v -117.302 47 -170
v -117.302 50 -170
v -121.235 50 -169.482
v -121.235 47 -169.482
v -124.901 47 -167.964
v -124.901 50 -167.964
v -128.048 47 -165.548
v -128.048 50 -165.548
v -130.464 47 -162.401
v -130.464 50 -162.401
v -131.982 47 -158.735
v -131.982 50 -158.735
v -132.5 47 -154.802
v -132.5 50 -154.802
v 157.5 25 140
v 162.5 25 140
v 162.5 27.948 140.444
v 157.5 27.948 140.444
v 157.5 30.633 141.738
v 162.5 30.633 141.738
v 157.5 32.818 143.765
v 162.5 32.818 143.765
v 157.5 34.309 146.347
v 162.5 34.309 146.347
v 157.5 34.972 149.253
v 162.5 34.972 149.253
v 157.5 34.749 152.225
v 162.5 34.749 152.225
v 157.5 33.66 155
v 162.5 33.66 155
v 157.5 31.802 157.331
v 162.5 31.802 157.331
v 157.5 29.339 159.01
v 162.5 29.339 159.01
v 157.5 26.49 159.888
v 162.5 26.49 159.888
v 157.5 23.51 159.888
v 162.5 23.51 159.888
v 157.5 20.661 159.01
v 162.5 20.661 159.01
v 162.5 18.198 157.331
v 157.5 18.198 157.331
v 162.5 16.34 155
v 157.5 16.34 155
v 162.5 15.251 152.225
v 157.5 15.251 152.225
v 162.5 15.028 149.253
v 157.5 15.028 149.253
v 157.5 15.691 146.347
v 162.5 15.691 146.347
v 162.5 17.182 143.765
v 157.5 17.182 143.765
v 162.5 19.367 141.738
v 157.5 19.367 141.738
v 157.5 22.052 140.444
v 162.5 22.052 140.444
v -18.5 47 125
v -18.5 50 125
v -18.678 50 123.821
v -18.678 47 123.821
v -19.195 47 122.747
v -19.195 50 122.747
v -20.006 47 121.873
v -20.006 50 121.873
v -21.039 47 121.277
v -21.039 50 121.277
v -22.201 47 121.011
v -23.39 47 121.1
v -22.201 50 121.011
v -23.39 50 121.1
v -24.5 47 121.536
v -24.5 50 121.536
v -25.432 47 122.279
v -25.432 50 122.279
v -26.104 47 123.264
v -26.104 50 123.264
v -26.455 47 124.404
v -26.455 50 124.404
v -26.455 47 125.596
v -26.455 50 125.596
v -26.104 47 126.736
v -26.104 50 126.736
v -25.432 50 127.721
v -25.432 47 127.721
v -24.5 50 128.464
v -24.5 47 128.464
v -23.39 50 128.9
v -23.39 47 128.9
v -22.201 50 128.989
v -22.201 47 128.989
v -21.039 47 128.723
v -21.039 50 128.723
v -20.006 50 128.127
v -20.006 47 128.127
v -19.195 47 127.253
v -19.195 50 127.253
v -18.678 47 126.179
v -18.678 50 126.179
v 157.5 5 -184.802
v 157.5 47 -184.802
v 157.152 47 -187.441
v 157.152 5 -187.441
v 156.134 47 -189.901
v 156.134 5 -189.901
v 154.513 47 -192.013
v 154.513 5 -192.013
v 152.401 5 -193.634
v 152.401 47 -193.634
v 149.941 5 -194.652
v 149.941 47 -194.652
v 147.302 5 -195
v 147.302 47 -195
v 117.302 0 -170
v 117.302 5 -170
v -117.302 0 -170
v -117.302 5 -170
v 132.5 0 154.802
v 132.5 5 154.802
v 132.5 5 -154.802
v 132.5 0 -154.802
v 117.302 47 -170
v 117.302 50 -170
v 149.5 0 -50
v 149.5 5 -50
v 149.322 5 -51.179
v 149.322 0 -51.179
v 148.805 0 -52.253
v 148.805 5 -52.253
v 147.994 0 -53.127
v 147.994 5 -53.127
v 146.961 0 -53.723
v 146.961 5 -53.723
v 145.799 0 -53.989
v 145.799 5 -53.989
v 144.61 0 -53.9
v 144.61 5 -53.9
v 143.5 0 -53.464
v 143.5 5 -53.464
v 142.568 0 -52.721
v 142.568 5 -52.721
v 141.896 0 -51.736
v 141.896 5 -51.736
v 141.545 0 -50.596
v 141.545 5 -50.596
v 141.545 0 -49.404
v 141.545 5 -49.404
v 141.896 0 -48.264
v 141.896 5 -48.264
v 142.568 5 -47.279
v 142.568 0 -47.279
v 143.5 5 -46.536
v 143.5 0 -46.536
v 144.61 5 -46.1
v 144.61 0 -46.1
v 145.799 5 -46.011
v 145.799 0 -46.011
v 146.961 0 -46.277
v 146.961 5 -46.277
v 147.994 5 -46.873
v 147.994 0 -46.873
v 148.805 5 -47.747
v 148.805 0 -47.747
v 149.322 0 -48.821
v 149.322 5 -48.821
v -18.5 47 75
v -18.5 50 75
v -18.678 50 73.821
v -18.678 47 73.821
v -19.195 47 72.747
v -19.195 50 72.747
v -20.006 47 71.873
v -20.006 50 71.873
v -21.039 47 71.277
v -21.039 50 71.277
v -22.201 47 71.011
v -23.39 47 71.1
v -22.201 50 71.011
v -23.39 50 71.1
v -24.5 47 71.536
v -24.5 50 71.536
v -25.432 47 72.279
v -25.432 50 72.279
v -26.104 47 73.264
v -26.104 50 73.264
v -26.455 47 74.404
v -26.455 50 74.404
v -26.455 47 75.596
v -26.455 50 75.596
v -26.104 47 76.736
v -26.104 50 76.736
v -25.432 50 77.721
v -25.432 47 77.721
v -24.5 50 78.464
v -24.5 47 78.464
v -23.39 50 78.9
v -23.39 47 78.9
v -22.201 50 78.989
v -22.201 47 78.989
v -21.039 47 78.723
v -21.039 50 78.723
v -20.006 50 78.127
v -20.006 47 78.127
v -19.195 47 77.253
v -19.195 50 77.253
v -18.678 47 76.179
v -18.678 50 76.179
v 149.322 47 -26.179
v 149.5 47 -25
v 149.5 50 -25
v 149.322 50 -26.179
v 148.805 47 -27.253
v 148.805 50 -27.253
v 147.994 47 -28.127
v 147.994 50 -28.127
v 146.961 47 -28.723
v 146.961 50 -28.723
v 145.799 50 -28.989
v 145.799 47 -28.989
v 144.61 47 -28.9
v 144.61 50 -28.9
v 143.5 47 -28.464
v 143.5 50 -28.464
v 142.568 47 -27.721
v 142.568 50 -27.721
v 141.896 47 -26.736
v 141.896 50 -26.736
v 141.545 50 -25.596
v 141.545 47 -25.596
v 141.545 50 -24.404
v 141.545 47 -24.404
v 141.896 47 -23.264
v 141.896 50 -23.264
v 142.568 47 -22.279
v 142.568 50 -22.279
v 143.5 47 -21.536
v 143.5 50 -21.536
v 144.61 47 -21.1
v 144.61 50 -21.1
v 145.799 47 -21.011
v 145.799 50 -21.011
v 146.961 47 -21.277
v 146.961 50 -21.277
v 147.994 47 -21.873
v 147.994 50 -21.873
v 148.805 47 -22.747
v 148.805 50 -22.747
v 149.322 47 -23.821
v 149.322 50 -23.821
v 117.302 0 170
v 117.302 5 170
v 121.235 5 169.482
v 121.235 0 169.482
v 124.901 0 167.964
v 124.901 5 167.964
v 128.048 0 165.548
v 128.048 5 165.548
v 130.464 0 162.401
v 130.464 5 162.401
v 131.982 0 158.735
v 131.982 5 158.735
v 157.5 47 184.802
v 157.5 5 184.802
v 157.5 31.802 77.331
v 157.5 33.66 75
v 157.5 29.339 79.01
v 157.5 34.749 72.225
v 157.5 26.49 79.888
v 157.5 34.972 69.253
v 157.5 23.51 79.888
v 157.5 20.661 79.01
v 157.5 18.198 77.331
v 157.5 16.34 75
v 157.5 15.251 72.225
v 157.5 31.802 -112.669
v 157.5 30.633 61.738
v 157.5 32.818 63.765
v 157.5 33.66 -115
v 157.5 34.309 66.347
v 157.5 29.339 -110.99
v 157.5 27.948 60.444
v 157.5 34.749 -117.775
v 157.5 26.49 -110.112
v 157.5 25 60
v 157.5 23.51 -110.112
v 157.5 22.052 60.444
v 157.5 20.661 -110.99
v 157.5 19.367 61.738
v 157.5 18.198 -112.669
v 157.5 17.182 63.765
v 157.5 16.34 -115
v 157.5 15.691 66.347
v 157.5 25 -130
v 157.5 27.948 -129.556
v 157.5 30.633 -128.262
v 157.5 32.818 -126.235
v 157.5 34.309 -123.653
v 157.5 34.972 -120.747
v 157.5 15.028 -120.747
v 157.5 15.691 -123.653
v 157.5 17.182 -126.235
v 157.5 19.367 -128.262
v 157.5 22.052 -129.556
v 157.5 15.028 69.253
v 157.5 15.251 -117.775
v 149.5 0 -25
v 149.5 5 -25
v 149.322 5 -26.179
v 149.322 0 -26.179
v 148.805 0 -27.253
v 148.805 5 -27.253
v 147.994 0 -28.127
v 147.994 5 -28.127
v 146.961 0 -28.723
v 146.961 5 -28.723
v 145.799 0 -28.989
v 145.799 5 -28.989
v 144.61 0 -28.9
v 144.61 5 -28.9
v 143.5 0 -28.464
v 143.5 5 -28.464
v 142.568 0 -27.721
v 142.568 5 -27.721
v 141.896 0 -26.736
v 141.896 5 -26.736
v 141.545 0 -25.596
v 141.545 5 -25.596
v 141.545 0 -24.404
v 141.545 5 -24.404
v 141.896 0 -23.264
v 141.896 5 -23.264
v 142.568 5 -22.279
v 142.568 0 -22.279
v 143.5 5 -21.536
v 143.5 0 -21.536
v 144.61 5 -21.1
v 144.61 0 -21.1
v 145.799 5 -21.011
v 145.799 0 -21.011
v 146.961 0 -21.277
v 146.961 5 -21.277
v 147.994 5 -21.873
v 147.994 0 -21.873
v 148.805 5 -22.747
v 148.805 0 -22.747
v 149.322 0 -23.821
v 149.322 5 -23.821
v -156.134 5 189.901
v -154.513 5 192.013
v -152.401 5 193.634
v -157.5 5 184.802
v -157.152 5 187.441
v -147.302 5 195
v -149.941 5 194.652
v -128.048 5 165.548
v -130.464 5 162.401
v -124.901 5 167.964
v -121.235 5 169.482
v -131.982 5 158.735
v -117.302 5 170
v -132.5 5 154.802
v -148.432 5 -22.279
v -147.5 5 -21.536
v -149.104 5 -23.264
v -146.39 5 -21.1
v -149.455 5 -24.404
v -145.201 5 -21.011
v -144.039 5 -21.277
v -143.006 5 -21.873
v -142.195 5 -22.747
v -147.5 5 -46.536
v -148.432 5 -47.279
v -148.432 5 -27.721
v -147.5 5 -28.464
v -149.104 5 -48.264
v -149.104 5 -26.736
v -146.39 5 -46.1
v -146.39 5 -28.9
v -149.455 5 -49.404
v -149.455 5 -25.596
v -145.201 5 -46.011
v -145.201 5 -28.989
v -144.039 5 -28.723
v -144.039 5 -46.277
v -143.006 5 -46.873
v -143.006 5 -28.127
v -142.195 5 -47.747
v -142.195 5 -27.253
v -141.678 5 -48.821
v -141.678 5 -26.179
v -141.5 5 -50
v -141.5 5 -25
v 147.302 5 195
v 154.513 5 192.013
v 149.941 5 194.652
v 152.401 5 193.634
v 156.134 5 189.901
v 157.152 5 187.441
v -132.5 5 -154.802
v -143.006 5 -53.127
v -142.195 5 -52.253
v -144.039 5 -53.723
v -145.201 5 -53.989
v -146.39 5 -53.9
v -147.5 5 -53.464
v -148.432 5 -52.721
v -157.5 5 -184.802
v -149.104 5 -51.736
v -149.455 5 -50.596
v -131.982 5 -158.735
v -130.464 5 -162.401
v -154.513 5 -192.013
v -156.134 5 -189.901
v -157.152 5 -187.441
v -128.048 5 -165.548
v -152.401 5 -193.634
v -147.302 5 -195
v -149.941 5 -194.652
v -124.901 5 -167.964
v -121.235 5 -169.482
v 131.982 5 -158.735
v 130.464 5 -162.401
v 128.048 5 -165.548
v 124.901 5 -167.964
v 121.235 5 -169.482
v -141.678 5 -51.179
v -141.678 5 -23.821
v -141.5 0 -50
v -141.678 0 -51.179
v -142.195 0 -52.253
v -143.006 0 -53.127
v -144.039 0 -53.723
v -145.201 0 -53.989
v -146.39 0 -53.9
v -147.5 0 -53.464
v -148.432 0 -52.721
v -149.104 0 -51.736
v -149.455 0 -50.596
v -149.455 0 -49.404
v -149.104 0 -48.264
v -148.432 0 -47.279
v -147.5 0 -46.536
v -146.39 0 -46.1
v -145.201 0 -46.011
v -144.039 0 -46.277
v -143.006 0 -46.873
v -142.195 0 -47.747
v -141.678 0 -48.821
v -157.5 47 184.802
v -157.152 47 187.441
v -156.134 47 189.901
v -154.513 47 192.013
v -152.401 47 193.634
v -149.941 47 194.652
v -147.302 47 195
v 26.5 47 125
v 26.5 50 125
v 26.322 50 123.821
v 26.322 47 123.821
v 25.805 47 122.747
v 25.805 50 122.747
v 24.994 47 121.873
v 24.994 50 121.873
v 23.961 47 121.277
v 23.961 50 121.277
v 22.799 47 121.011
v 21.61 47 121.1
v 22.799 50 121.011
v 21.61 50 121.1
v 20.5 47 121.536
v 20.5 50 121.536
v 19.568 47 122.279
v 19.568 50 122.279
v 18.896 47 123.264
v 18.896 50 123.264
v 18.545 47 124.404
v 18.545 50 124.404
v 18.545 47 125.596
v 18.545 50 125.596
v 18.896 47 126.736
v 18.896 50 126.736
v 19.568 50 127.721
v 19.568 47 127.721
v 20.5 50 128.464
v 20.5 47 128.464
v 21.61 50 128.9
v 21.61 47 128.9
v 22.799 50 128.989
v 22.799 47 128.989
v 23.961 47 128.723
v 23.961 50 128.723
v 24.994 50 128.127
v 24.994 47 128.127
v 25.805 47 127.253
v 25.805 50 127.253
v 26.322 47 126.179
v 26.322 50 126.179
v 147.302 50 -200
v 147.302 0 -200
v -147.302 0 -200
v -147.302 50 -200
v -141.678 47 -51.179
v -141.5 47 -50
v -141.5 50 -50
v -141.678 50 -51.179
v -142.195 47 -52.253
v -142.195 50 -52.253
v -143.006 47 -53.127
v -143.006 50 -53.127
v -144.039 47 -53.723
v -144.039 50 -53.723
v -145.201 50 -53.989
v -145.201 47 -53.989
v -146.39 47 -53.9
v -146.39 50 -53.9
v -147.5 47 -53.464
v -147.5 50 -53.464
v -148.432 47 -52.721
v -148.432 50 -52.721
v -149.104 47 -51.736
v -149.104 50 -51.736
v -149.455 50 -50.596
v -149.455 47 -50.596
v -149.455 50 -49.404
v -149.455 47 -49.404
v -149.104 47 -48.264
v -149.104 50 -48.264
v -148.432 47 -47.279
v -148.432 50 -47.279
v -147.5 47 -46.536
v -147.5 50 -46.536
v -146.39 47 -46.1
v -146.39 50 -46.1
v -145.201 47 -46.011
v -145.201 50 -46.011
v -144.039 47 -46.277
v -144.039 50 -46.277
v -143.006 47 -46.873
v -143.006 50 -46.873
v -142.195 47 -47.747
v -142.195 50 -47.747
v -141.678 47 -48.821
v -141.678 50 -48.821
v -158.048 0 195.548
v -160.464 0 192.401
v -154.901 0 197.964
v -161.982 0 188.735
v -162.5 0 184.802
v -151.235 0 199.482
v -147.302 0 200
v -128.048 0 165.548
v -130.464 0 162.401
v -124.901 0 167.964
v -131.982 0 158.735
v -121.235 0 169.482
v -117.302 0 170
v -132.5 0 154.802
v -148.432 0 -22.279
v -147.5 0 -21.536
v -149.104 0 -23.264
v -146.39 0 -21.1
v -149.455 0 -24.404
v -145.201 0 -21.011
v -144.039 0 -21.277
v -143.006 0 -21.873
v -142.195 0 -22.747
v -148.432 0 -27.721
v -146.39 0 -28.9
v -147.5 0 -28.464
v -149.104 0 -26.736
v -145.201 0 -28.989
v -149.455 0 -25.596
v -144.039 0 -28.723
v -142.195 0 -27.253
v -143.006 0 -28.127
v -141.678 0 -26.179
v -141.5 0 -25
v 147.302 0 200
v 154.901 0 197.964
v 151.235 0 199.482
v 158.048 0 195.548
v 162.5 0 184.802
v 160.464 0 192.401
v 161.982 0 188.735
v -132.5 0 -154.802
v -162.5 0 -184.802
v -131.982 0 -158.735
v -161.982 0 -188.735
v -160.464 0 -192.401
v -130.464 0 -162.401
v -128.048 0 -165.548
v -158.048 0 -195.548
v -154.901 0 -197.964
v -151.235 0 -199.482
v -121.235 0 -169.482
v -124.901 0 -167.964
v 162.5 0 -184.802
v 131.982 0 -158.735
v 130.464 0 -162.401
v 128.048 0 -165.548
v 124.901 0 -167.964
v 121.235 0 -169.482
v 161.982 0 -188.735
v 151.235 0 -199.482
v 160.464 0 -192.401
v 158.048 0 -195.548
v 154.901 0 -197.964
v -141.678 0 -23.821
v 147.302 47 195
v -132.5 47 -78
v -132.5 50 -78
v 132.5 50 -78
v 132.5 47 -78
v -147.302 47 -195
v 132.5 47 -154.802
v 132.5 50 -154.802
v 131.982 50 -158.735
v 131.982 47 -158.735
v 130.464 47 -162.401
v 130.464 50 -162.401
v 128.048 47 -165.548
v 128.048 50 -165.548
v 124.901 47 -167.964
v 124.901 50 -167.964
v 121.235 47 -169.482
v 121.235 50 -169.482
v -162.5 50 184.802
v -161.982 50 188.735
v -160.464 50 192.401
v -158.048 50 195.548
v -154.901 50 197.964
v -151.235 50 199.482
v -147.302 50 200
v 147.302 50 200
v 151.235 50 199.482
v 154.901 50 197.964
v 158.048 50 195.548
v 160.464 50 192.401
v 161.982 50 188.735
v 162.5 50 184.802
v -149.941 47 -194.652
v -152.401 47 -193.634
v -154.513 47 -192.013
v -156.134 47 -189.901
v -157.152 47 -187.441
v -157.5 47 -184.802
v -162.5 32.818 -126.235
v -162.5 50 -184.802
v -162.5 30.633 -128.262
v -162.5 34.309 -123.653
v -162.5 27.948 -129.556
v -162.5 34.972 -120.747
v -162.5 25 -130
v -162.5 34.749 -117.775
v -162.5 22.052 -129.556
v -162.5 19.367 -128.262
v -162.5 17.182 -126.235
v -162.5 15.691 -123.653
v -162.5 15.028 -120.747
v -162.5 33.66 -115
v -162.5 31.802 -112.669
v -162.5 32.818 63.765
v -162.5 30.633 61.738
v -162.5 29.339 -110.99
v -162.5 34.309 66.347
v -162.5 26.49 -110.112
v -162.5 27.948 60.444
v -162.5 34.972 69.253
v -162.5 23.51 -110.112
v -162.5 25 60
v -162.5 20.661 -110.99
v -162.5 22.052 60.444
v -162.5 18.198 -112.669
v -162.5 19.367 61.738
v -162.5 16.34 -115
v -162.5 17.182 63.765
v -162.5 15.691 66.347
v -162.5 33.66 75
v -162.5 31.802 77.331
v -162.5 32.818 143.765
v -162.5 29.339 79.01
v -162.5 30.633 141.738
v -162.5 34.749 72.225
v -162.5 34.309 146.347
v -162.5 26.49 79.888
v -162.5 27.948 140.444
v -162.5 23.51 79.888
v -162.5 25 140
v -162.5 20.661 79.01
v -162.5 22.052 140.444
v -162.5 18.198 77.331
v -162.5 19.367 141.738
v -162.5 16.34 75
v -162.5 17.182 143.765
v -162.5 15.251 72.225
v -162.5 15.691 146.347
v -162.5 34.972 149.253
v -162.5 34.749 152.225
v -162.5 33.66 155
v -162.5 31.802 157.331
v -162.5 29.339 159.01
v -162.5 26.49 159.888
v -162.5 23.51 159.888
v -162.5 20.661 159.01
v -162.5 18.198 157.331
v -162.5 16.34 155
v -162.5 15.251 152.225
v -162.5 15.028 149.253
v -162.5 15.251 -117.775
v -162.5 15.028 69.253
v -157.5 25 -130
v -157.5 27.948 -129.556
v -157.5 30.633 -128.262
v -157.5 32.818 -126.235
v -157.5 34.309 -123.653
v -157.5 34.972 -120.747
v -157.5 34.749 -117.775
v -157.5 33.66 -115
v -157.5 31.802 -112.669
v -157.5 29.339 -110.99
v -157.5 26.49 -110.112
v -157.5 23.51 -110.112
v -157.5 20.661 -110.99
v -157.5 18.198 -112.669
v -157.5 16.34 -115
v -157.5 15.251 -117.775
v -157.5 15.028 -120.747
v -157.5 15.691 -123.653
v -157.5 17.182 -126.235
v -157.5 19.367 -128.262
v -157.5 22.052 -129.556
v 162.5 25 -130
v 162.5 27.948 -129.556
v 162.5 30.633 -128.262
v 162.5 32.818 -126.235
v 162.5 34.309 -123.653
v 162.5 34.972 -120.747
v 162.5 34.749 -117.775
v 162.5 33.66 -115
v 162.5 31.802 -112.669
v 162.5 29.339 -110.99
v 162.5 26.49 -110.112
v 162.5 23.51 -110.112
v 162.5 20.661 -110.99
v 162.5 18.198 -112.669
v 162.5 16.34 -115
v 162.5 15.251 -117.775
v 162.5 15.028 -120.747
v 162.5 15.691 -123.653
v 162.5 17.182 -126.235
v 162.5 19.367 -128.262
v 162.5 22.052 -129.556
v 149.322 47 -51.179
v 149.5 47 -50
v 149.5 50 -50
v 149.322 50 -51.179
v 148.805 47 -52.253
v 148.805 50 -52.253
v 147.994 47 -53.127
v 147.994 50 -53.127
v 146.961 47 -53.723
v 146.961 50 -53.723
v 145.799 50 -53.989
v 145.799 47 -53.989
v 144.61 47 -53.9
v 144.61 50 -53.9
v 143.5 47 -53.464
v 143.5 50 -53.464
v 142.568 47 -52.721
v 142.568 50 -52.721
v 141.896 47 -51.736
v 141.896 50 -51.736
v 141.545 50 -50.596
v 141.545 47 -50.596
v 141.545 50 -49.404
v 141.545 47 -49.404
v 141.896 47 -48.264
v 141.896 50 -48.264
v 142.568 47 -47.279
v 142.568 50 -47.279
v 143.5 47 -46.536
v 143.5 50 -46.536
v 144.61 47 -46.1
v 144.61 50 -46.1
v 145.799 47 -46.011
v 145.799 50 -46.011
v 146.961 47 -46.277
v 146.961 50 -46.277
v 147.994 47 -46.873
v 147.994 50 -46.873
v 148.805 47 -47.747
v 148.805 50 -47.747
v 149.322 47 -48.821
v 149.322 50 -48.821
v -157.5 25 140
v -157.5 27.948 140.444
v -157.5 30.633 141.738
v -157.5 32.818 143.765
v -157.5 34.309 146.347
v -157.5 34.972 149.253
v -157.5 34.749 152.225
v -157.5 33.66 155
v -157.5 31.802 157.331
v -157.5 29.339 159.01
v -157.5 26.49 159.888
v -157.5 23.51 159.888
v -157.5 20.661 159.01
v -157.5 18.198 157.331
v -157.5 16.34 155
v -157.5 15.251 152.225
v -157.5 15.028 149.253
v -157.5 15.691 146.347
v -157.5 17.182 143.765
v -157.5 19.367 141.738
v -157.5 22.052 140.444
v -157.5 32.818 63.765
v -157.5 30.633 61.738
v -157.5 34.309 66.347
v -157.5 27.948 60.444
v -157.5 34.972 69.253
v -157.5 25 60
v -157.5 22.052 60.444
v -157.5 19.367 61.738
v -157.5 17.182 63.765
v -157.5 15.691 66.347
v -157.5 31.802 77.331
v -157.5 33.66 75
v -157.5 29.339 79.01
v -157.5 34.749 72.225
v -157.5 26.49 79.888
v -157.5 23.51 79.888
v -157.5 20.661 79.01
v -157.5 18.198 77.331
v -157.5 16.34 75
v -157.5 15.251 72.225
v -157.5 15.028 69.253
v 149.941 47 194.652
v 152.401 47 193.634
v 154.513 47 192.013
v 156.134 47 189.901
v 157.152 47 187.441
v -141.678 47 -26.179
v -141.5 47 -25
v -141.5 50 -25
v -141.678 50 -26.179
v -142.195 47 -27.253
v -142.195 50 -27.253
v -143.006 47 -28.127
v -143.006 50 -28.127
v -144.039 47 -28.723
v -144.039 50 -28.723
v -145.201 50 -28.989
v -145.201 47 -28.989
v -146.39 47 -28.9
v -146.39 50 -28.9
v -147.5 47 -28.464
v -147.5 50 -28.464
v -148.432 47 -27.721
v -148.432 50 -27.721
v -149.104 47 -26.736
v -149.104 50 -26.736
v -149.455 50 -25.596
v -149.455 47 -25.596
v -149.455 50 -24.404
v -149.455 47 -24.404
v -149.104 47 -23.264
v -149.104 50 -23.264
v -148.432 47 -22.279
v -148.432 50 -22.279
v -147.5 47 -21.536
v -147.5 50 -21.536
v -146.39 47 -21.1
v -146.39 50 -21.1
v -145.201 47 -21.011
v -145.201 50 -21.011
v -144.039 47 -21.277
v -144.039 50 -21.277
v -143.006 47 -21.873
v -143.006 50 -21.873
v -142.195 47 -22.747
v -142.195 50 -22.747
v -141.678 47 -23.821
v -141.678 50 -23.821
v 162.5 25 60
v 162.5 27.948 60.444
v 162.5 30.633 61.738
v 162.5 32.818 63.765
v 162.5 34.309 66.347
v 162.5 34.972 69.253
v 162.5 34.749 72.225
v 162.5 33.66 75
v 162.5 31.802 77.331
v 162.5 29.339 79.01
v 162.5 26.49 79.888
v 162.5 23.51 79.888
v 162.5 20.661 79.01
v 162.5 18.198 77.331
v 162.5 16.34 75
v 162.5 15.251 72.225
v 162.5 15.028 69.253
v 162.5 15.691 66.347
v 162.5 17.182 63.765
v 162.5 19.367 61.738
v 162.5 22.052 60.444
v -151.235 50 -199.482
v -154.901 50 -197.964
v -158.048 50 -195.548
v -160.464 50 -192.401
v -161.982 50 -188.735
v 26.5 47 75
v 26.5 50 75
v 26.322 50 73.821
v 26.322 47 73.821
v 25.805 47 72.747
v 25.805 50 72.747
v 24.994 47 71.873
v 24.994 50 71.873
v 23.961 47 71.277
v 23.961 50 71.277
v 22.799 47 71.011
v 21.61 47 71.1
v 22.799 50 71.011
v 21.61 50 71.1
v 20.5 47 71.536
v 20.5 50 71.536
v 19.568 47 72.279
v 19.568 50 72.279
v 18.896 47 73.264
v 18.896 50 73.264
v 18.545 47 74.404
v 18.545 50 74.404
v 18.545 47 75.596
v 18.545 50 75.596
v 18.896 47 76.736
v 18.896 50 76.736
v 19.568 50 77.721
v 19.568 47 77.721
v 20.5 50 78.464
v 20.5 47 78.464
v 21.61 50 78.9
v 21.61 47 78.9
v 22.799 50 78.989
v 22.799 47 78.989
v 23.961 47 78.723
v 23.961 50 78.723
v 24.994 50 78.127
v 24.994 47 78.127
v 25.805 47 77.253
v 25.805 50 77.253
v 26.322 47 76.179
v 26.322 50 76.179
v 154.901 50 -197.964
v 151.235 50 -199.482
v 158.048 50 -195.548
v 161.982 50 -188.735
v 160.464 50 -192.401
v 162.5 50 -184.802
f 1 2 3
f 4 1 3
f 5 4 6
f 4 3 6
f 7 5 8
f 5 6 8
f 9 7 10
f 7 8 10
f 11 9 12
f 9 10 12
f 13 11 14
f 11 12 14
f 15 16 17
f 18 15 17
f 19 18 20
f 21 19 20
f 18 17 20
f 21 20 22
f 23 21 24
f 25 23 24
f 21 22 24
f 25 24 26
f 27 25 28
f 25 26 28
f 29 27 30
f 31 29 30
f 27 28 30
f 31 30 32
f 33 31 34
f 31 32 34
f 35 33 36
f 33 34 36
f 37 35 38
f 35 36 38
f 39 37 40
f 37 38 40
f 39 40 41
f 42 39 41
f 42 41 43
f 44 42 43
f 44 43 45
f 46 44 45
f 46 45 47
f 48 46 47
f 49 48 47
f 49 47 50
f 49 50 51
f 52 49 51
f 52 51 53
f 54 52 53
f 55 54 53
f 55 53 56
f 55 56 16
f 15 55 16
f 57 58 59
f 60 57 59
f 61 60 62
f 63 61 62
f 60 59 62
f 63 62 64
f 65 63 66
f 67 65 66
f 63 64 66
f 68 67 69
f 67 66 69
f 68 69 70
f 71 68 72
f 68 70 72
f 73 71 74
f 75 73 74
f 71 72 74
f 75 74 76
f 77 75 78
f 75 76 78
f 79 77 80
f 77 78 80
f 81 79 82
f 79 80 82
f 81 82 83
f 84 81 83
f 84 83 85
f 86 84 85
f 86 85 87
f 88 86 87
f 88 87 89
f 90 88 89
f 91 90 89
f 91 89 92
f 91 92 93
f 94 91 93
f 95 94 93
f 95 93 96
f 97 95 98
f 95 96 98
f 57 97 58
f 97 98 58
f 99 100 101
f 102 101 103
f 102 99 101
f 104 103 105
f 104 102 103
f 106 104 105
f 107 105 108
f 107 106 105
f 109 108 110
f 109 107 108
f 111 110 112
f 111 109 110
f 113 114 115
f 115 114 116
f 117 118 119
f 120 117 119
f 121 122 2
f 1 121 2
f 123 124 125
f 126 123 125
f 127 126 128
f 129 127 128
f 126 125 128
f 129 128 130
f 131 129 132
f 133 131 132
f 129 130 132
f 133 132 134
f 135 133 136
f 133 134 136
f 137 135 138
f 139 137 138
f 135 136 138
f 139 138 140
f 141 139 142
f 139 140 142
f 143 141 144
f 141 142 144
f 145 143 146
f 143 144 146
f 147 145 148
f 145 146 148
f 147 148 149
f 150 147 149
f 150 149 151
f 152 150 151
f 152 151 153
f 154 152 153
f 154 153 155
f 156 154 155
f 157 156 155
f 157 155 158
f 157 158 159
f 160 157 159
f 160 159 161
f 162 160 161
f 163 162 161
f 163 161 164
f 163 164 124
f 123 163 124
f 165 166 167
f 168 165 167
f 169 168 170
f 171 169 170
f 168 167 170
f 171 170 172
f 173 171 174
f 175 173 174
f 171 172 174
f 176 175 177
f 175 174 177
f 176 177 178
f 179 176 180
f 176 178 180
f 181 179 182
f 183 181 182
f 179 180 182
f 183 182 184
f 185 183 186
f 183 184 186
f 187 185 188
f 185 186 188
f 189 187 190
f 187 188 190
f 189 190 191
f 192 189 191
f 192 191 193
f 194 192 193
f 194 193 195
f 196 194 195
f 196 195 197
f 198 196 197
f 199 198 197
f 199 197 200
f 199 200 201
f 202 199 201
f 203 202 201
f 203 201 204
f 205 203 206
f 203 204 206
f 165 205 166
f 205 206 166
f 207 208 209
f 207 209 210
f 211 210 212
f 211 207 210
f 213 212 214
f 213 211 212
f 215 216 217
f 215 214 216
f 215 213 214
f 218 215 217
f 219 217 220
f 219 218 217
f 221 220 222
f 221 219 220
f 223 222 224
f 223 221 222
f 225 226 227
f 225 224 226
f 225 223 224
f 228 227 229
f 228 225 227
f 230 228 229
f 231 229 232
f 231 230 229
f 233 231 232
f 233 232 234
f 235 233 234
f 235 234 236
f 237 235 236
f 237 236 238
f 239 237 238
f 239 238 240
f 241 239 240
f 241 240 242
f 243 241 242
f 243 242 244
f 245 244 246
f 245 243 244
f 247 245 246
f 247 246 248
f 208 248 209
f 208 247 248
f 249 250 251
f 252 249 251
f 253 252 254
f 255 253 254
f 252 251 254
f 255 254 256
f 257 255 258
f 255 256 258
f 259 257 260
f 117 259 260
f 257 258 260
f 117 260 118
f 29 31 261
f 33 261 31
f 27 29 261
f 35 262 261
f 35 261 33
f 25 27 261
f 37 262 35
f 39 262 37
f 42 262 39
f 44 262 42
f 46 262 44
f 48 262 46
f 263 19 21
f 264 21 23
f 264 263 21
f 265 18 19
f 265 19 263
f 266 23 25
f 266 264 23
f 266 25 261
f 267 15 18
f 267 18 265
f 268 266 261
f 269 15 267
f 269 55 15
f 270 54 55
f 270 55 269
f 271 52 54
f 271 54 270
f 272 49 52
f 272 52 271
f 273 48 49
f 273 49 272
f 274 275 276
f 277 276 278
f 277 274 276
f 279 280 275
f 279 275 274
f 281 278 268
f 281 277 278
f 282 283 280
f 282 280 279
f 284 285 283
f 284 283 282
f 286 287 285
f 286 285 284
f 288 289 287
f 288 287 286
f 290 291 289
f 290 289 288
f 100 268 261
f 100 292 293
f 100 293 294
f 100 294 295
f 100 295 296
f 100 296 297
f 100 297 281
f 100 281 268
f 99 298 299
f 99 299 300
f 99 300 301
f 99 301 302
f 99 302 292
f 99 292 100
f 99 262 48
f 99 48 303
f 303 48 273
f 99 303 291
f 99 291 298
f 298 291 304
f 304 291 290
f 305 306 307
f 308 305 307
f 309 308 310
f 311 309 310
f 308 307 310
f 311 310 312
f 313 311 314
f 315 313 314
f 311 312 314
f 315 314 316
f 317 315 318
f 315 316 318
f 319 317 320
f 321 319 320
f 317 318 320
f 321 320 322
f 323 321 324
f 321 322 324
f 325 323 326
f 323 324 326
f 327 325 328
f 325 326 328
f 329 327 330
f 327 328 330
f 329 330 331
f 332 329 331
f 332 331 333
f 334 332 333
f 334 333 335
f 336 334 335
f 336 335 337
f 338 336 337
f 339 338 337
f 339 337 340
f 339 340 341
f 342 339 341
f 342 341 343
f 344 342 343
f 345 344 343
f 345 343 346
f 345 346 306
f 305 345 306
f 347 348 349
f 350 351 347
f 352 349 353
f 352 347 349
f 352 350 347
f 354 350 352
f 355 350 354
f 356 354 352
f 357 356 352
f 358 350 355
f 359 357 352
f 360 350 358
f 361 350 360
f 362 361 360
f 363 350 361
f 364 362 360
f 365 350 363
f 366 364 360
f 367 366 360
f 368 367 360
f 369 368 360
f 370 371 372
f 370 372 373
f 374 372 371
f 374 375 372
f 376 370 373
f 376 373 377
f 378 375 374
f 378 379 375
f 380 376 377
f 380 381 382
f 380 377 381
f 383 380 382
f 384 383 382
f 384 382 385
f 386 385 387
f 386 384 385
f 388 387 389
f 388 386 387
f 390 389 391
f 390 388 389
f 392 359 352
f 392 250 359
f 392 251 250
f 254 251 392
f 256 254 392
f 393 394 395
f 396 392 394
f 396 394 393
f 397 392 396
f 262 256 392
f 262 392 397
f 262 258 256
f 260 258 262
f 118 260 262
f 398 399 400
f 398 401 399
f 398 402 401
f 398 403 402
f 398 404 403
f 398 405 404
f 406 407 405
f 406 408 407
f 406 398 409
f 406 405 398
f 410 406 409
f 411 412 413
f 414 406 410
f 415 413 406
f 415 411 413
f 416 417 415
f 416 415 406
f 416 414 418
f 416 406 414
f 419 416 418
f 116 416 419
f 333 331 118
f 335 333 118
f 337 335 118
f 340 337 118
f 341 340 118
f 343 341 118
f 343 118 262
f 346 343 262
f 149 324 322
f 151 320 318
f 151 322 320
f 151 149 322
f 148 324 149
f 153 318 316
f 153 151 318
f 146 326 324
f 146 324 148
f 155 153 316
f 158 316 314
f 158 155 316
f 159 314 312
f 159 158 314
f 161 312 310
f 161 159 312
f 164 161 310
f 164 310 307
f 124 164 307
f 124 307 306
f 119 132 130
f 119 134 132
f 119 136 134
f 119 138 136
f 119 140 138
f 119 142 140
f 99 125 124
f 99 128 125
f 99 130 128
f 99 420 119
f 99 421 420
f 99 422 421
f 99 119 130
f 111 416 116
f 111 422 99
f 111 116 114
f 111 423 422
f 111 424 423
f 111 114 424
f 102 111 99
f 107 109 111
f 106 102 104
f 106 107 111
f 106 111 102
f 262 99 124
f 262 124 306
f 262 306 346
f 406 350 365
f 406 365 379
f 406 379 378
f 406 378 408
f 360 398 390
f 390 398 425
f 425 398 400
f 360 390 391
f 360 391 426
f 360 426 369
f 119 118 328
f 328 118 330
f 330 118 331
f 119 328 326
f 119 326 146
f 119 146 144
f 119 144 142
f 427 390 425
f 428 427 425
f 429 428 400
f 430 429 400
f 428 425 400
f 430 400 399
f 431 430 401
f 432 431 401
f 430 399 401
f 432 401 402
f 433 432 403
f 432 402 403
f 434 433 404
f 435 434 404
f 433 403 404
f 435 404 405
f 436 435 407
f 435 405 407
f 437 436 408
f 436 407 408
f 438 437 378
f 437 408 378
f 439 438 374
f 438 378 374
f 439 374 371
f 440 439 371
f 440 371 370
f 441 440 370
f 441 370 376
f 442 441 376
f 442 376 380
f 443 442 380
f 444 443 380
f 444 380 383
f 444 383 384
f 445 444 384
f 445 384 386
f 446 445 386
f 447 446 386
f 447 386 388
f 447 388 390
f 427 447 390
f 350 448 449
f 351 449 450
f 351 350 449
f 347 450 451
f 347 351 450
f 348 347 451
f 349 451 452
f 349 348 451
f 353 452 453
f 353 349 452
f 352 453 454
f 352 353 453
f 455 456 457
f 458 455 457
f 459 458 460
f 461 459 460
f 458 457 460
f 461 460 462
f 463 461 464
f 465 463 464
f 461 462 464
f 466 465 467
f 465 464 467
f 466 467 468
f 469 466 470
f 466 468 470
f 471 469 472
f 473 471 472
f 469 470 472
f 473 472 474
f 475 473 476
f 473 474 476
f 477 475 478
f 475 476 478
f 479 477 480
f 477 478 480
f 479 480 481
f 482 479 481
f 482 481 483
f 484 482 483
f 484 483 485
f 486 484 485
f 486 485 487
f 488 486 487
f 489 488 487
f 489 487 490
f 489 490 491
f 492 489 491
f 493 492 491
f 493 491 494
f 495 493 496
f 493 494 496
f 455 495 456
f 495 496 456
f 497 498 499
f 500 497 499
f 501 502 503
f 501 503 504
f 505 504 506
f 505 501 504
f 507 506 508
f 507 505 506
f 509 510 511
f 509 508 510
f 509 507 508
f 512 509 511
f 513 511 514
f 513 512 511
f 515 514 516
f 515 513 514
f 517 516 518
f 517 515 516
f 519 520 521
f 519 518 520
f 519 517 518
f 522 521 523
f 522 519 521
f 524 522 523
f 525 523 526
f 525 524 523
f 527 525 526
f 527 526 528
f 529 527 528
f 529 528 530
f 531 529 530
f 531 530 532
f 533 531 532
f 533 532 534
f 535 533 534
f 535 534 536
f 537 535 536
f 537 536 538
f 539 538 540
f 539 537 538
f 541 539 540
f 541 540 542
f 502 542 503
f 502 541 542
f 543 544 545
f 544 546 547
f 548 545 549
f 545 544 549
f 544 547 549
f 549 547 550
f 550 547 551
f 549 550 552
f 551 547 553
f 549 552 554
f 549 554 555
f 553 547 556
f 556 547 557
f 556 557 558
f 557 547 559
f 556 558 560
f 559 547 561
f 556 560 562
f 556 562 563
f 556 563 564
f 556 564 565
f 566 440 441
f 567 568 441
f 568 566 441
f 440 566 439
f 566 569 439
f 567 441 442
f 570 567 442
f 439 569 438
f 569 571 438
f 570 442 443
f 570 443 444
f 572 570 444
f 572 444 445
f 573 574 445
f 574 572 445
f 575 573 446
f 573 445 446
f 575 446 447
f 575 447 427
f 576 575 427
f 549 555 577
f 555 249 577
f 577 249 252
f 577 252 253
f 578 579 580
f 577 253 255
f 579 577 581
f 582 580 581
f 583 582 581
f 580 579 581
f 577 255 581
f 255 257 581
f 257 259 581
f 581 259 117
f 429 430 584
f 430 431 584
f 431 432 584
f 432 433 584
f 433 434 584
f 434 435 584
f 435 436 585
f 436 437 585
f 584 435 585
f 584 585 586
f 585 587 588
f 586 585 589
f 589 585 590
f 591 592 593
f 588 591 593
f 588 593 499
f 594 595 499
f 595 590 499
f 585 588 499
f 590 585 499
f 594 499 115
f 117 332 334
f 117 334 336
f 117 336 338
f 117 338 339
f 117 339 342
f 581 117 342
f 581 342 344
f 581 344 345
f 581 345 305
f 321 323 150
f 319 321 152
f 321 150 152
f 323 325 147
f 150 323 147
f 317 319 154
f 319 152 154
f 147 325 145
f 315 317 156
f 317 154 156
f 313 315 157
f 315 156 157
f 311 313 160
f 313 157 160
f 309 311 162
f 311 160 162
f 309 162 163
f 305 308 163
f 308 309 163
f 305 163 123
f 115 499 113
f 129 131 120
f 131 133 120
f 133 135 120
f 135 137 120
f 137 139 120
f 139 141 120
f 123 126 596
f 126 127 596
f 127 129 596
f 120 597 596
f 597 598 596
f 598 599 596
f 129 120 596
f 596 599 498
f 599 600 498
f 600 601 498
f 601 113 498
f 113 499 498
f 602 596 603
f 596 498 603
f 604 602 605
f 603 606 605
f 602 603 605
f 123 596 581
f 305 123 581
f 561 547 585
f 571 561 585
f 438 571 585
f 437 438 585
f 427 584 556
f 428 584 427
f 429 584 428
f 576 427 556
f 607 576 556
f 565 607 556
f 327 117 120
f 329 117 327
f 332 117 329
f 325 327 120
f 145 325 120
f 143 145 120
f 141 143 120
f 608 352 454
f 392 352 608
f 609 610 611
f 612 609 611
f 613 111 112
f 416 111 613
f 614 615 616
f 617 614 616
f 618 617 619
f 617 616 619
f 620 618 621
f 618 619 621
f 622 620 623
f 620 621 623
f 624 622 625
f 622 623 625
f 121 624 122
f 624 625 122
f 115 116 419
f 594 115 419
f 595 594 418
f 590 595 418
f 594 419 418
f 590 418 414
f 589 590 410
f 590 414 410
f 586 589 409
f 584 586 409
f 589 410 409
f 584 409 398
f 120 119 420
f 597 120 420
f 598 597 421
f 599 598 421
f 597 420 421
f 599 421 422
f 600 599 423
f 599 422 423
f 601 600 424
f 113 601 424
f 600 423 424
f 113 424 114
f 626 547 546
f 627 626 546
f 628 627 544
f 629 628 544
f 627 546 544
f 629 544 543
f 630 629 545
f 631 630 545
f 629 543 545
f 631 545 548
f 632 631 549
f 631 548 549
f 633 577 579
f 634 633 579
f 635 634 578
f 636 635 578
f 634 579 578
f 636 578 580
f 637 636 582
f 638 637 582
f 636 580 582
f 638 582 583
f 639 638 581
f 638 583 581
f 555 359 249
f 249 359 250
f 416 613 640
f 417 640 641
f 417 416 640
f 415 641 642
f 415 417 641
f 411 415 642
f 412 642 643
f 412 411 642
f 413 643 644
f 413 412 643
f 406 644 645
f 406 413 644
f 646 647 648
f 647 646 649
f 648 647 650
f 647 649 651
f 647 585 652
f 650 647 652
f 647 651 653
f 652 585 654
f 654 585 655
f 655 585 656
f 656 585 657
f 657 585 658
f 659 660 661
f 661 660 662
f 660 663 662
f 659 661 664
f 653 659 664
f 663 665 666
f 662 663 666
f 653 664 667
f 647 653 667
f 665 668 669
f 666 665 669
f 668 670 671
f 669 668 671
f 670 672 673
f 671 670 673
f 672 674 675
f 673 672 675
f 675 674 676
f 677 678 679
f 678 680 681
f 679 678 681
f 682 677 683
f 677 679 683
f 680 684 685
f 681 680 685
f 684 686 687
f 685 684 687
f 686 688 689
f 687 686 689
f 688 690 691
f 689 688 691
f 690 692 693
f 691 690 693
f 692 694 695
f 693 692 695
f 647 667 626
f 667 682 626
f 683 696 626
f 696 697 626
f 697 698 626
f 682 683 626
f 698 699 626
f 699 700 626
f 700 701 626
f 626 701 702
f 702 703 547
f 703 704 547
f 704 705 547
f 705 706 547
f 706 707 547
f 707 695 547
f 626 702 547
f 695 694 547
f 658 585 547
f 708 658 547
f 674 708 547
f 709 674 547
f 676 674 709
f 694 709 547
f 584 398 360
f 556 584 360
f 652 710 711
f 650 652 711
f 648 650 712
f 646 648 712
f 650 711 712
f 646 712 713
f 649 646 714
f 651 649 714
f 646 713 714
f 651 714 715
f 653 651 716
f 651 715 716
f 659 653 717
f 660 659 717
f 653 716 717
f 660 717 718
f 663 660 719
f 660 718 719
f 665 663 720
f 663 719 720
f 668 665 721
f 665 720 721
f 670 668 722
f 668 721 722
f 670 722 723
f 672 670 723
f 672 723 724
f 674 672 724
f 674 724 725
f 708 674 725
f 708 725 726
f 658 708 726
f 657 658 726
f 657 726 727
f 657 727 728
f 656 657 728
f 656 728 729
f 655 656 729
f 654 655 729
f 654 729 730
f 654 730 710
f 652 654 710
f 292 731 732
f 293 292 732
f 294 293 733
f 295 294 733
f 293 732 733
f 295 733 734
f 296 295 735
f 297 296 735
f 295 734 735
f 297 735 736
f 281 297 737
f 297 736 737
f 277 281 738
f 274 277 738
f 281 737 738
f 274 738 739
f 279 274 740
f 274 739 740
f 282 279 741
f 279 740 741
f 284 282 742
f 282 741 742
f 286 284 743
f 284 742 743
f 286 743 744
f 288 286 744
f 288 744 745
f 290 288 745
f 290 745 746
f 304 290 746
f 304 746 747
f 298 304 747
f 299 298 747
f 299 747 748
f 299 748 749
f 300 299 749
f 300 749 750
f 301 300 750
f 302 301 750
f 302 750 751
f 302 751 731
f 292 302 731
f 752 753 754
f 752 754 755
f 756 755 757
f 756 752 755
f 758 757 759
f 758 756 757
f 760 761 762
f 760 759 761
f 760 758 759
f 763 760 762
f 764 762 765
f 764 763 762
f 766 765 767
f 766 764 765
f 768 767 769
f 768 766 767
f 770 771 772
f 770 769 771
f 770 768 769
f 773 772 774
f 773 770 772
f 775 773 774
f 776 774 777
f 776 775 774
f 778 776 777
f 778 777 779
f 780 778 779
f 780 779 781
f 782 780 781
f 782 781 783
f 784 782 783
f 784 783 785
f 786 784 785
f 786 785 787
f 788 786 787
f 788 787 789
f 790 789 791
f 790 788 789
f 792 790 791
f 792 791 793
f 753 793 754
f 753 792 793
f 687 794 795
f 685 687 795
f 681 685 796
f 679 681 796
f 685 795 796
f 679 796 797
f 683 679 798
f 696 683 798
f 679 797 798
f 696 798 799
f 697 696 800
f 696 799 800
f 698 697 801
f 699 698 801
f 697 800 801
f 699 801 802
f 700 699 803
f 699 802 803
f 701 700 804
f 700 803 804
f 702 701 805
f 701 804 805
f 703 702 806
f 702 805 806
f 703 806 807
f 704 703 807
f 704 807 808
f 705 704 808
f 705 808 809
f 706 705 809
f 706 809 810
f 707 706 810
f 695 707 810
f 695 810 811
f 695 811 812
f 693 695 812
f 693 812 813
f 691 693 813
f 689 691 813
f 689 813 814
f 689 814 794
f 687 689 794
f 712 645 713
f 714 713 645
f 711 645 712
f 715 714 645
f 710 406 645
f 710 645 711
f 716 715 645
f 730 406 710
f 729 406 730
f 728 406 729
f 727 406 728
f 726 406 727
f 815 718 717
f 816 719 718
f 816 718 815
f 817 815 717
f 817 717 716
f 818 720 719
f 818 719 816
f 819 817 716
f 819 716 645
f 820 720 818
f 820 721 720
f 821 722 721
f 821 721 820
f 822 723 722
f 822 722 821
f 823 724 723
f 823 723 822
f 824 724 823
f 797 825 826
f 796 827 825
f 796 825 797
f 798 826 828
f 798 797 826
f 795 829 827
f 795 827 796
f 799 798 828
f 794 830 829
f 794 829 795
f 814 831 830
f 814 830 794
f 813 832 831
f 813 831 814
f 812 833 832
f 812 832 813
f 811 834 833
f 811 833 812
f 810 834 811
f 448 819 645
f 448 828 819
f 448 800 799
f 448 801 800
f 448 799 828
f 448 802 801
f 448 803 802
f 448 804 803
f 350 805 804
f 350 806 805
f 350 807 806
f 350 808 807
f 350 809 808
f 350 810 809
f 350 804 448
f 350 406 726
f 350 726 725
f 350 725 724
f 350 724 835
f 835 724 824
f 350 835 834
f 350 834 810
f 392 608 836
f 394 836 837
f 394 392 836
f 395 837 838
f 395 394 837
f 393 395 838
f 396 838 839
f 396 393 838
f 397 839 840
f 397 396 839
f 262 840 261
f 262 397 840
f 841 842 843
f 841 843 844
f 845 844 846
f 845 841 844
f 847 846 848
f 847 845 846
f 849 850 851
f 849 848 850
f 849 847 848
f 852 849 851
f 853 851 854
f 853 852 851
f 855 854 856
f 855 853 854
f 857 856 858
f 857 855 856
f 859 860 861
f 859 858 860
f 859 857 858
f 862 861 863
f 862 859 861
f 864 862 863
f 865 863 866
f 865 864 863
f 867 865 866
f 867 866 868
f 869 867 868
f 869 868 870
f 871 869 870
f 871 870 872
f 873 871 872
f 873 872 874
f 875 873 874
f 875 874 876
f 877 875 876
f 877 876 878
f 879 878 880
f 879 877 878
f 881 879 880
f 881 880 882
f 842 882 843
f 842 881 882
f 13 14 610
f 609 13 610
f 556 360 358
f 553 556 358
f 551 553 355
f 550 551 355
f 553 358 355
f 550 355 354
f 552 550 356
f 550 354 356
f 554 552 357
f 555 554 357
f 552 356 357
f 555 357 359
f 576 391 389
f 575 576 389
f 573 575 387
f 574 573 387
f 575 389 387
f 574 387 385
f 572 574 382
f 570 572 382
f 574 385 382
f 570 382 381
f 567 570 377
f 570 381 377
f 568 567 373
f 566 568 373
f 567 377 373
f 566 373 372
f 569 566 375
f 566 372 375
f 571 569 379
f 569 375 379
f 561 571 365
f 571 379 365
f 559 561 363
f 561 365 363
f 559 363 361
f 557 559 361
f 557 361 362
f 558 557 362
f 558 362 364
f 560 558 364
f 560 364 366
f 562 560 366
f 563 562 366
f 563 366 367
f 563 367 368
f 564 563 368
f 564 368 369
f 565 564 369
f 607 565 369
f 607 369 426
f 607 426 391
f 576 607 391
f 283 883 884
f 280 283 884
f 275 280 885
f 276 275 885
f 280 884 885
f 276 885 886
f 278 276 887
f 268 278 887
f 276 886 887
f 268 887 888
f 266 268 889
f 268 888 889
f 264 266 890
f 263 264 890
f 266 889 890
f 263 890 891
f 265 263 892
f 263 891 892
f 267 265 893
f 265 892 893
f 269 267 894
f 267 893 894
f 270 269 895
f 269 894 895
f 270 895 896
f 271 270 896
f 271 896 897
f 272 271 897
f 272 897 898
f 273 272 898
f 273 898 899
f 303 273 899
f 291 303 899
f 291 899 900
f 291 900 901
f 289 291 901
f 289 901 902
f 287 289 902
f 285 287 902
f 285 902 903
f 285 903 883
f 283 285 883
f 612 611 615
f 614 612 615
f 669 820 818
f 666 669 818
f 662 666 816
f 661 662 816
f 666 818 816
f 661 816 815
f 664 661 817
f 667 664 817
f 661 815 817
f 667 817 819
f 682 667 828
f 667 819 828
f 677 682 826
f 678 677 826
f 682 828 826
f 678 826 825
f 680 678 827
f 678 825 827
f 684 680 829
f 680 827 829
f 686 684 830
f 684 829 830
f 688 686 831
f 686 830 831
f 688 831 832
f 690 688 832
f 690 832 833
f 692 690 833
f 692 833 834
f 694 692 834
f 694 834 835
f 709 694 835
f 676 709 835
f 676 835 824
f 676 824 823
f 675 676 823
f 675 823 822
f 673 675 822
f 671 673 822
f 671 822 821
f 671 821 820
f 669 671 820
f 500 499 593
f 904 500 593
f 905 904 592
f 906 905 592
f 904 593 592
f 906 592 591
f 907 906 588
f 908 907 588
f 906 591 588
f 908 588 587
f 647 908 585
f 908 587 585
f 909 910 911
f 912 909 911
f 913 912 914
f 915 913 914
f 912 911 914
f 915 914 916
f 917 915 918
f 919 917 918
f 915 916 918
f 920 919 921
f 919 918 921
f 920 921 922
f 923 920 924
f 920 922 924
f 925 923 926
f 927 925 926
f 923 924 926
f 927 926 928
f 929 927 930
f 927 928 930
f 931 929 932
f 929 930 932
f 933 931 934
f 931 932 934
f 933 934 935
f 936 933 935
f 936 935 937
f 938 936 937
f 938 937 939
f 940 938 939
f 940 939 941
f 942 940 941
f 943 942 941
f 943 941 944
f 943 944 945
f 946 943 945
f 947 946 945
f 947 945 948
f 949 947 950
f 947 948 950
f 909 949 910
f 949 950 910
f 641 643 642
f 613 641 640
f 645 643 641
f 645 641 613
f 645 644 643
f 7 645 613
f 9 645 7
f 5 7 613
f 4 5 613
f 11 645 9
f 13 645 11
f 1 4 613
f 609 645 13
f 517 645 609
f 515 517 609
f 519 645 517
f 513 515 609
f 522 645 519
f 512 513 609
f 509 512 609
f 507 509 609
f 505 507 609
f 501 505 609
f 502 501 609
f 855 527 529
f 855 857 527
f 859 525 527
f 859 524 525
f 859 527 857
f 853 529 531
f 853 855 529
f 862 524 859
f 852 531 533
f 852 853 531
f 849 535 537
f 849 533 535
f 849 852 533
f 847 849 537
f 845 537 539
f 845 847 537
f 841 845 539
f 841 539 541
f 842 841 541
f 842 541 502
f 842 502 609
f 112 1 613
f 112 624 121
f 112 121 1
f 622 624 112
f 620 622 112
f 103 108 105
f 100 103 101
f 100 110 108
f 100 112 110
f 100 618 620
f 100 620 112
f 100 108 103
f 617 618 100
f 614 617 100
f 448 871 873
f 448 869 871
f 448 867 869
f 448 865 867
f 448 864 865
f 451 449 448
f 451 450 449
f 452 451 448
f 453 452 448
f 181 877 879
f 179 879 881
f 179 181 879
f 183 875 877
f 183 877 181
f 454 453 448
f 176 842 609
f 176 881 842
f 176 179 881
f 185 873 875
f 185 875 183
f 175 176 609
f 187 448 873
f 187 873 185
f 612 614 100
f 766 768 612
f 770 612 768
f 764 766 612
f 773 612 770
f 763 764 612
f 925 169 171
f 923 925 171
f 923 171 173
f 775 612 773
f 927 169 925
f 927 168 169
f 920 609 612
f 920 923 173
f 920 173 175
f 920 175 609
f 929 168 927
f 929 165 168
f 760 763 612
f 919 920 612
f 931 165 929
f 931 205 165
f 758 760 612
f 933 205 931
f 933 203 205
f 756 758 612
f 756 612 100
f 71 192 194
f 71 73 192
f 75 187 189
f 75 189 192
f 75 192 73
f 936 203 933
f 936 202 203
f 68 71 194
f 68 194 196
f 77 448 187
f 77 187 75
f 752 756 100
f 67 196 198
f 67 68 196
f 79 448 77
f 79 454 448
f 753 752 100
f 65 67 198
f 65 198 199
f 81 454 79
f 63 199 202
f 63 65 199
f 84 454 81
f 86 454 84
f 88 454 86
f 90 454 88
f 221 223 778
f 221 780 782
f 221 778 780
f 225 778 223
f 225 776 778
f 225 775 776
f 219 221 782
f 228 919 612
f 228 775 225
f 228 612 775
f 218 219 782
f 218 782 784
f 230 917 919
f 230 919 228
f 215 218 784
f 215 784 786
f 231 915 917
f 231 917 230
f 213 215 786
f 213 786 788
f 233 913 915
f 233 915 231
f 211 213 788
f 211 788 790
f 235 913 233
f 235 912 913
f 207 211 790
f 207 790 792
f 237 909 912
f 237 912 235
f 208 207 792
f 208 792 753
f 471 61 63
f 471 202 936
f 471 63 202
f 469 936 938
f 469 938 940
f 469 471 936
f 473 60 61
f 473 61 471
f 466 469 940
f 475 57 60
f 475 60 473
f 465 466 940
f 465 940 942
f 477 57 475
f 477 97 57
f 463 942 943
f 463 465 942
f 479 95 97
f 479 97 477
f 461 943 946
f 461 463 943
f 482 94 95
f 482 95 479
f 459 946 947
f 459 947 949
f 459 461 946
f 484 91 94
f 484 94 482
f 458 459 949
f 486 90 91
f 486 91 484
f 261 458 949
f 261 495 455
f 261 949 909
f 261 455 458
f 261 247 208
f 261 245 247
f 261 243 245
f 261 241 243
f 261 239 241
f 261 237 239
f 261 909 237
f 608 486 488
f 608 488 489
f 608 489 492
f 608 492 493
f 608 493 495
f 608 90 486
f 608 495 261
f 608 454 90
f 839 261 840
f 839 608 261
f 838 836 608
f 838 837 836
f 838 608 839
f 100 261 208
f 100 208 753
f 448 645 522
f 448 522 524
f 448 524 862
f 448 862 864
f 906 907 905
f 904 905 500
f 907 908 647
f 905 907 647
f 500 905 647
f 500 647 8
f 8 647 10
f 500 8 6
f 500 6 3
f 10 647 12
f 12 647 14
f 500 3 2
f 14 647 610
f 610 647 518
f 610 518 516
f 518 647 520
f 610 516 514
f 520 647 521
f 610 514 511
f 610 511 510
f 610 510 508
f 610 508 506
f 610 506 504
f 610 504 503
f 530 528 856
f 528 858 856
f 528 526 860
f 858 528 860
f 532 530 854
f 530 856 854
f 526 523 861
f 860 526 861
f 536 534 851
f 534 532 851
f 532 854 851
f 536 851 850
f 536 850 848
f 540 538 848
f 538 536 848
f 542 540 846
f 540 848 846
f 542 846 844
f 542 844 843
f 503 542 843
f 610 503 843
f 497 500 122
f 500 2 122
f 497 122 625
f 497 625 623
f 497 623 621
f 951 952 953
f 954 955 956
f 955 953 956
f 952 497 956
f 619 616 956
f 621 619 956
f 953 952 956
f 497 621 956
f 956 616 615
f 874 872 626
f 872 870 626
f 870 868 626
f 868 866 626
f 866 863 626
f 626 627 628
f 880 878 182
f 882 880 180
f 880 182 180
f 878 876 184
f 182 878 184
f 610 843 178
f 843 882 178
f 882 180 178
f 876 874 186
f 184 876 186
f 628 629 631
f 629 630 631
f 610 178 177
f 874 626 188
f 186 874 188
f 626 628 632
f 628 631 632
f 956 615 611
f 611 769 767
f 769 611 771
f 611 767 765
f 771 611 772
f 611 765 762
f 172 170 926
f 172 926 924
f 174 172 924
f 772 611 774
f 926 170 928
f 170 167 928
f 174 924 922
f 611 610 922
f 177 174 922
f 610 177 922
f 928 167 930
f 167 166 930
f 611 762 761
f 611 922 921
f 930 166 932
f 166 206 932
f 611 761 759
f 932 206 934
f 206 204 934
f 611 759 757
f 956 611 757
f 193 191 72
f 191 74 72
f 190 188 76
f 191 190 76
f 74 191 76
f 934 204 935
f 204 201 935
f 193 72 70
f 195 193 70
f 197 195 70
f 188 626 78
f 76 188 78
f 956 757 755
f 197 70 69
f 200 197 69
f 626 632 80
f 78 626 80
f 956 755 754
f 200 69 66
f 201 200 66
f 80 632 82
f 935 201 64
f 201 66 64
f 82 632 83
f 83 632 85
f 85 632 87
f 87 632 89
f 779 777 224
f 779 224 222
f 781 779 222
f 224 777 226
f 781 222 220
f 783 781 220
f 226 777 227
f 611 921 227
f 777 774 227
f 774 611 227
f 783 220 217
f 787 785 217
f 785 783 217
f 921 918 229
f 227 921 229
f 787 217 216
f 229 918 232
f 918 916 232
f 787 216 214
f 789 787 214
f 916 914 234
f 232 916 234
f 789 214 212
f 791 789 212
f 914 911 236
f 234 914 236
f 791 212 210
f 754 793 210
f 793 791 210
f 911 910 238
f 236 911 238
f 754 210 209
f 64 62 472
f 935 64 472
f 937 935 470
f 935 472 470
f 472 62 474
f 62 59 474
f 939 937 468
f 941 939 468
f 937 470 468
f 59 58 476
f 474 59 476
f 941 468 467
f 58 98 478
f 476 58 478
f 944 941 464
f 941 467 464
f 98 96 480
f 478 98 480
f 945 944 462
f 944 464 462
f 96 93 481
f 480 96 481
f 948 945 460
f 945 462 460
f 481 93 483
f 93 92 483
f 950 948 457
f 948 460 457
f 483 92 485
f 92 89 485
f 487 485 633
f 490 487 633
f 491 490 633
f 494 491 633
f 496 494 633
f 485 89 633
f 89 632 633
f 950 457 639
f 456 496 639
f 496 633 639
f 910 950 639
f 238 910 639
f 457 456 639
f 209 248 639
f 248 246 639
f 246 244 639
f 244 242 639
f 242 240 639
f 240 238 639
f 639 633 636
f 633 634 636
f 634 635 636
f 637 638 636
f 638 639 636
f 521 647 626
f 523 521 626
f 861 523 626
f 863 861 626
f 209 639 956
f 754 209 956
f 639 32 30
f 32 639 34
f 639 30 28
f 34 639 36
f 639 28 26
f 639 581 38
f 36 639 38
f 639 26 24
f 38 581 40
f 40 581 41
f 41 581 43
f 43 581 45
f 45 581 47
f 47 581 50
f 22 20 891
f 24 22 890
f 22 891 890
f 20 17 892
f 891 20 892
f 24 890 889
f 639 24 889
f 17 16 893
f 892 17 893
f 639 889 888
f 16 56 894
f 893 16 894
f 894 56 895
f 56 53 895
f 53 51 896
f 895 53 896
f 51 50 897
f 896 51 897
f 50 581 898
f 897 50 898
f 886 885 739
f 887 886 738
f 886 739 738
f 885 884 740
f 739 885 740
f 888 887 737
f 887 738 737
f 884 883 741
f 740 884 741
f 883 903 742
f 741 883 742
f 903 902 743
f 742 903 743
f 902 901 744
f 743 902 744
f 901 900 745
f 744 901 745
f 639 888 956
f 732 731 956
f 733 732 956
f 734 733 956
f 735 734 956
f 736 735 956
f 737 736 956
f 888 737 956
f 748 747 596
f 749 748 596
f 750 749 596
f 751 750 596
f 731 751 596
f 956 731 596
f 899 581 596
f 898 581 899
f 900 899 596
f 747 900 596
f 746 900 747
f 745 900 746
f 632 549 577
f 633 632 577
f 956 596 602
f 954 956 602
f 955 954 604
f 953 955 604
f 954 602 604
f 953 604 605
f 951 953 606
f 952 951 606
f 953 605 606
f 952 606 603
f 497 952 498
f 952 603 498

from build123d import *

# Parameters (mm, degrees)
BOSS_EXTRUDE1_DEPTH     = 50
SHELL1_T                = -5
SKETCH2_R               = 10
CUT_EXTRUDE1_DEPTH      = 325
BOSS_EXTRUDE2_DEPTH     = 3
CUT_EXTRUDE2_DEPTH      = 50
SKETCH6_R               = 4
CUT_EXTRUDE3_DEPTH      = 46
CUT_EXTRUDE3_DEPTH_BACK = 6
SKETCH7_W               = 265
SKETCH7_H               = 3
BOSS_EXTRUDE4_DEPTH     = 187
SKETCH8_R               = 4
CUT_EXTRUDE4_DEPTH      = 3
SKETCH7_2_W             = 265
SKETCH7_2_H             = 3
BOSS_EXTRUDE5_DEPTH     = 78


with BuildPart() as part:
    # Sketch1 → Boss-Extrude1 (new body)
    with BuildSketch(Plane(origin=(0, 0, 0), x_dir=(1, 0, 0), z_dir=(0, 1, 0))):
        with BuildLine():
            Line((-147.30160795, -200), (147.30160795, -200))
            ThreePointArc((147.30160795, -200), (158.048494032, -195.548494032), (162.5, -184.80160795))
            Line((162.5, -184.80160795), (162.5, 184.80160795))
            ThreePointArc((162.5, 184.80160795), (158.048494032, 195.548494032), (147.30160795, 200))
            Line((147.30160795, 200), (-147.30160795, 200))
            ThreePointArc((-147.30160795, 200), (-158.048494032, 195.548494032), (-162.5, 184.80160795))
            Line((-162.5, 184.80160795), (-162.5, -184.80160795))
            ThreePointArc((-162.5, -184.80160795), (-158.048494032, -195.548494032), (-147.30160795, -200))
        make_face()
    extrude(amount=BOSS_EXTRUDE1_DEPTH)

    # Shell1
    shell1_openings = [part.faces().sort_by_distance(p)[0] for p in [
        (0, 50, 0),
    ]]
    offset(amount=SHELL1_T, openings=shell1_openings, kind=Kind.INTERSECTION)

    # Sketch2 → Cut-Extrude1 (cut)
    with BuildSketch(Plane(origin=(162.5, 0, 0), x_dir=(0, 0, -1), z_dir=(1, 0, 0))):
        with Locations((-150, 25)):
            Circle(SKETCH2_R)
        with Locations((120, 25)):
            Circle(SKETCH2_R)
        with Locations((-70, 25)):
            Circle(SKETCH2_R)
    extrude(amount=-CUT_EXTRUDE1_DEPTH, mode=Mode.SUBTRACT)

    # Sketch3 → Boss-Extrude2 (add)
    with BuildSketch(Plane(origin=(0, 50, 0), x_dir=(1, 0, 0), z_dir=(0, 1, 0))):
        with BuildLine():
            Line((147.30160795, 195), (-147.30160795, 195))
            ThreePointArc((-147.30160795, 195), (-154.512960126, 192.012960126), (-157.5, 184.80160795))
            Line((-157.5, 184.80160795), (-157.5, -184.80160795))
            ThreePointArc((-157.5, -184.80160795), (-154.512960126, -192.012960126), (-147.30160795, -195))
            Line((-147.30160795, -195), (147.30160795, -195))
            ThreePointArc((147.30160795, -195), (154.512960126, -192.012960126), (157.5, -184.80160795))
            Line((157.5, -184.80160795), (157.5, 184.80160795))
            ThreePointArc((157.5, 184.80160795), (154.512960126, 192.012960126), (147.30160795, 195))
        make_face()
    extrude(amount=-BOSS_EXTRUDE2_DEPTH)

    # Sketch4 → Cut-Extrude2 (cut)
    with BuildSketch(Plane(origin=(0, 50, 0), x_dir=(1, 0, 0), z_dir=(0, 1, 0))):
        with BuildLine():
            Line((-117.30160795, -170), (117.30160795, -170))
            ThreePointArc((117.30160795, -170), (128.048494032, -165.548494032), (132.5, -154.80160795))
            Line((132.5, -154.80160795), (132.5, 154.80160795))
            ThreePointArc((132.5, 154.80160795), (128.048494032, 165.548494032), (117.30160795, 170))
            Line((117.30160795, 170), (-117.30160795, 170))
            ThreePointArc((-117.30160795, 170), (-128.048494032, 165.548494032), (-132.5, 154.80160795))
            Line((-132.5, 154.80160795), (-132.5, -154.80160795))
            ThreePointArc((-132.5, -154.80160795), (-128.048494032, -165.548494032), (-117.30160795, -170))
        make_face()
    extrude(amount=-CUT_EXTRUDE2_DEPTH, mode=Mode.SUBTRACT)

    # Sketch6 → Cut-Extrude3 (cut, two sides)
    with BuildSketch(Plane(origin=(0, 5, 0), x_dir=(1, 0, 0), z_dir=(0, 1, 0))) as cut_extrude3_sk:
        with Locations((-145.5, 50)):
            Circle(SKETCH6_R)
        with Locations((-145.5, 25)):
            Circle(SKETCH6_R)
        with Locations((145.5, 25)):
            Circle(SKETCH6_R)
        with Locations((145.5, 50)):
            Circle(SKETCH6_R)
    extrude(amount=CUT_EXTRUDE3_DEPTH, mode=Mode.SUBTRACT)
    extrude(cut_extrude3_sk.sketch, amount=-CUT_EXTRUDE3_DEPTH_BACK, mode=Mode.SUBTRACT)

    # Sketch7 → Boss-Extrude4 (add)
    with BuildSketch(Plane.XY):
        with Locations((0, 48.5)):
            Rectangle(SKETCH7_W, SKETCH7_H)
    extrude(amount=BOSS_EXTRUDE4_DEPTH)

    # Sketch8 → Cut-Extrude4 (cut)
    with BuildSketch(Plane(origin=(0, 50, 0), x_dir=(1, 0, 0), z_dir=(0, 1, 0))):
        with Locations((-22.5, -125)):
            Circle(SKETCH8_R)
        with Locations((-22.5, -75)):
            Circle(SKETCH8_R)
        with Locations((22.5, -125)):
            Circle(SKETCH8_R)
        with Locations((22.5, -75)):
            Circle(SKETCH8_R)
    extrude(amount=-CUT_EXTRUDE4_DEPTH, mode=Mode.SUBTRACT)

    # Sketch7<2> → Boss-Extrude5 (add)
    with BuildSketch(Plane.XY):
        with Locations((0, 48.5)):
            Rectangle(SKETCH7_2_W, SKETCH7_2_H)
    extrude(amount=-BOSS_EXTRUDE5_DEPTH)


solid = part.part
